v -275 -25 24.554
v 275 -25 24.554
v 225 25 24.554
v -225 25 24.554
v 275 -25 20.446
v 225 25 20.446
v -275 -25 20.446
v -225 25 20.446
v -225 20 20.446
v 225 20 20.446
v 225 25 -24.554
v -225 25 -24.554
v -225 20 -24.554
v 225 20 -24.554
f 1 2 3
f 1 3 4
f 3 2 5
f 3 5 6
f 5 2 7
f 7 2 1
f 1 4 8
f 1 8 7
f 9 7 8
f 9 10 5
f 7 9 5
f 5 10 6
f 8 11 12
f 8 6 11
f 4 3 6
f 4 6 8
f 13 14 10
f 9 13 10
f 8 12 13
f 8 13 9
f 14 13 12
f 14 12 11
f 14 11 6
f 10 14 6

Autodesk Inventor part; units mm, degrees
ref_plane "YZ Plane" through (0, 0, 0) normal (1, 0, 0) x (0, 1, 0)
ref_plane "XZ Plane" through (0, 0, 0) normal (0, 1, 0) x (-1, 0, 0)
ref_plane "XY Plane" through (0, 0, 0) normal (0, 0, 1) x (1, 0, 0)
sketch "Sketch1" plane through (0, 0, 0) normal (0, 1, 0) x (-1, 0, 0)
  line L0 (-275, 24.5536) -> (275, 24.5536)
  line L1 (275, 24.5536) -> (275, -24.5536)
  line L2 (275, -24.5536) -> (-275, -24.5536)
  line L3 (-275, -24.5536) -> (-275, 24.5536)
  point P0 (0, 0)
  dimension "d14" = 550
extrude "Extrusion1" add sketch "Sketch1" along normal mid plane 50
sketch "Sketch2" plane through (275, -25, -24.5536) normal (1, 0, 0) x (0, 0, -1)
  line L0 (0, 0) -> (0, 50) projected
  line L1 (0, 45) -> (-45, 45)
  line L2 (-45, 45) -> (-45, 0)
  line L3 (-49.1071, 0) -> (0, 0) projected
  line L4 (-45, 0) -> (0, 0)
  line L5 (0, 0) -> (0, 45)
  point P0 (-24.5536, 25)
extrude "Extrusion2" cut sketch "Sketch2" against normal through all
sketch "Sketch5" plane through (0, 25, 0) normal (0, 1, 0) x (1, 0, 0)
  line L0 (-275, 24.5536) -> (-275, -24.5536) projected
  line L1 (-275, 24.5536) -> (-225, 24.5536)
  line L2 (275, 24.5536) -> (-275, 24.5536) projected
  line L3 (-225, 24.5536) -> (-225, -20.4464)
  line L4 (-275, -20.4464) -> (275, -20.4464) projected
  line L5 (-225, -20.4464) -> (-275, -20.4464)
  line L6 (-275, -20.4464) -> (-275, 24.5536)
  line L7 (275, -24.5536) -> (275, 24.5536) projected
  line L8 (275, 24.5536) -> (225, 24.5536)
  line L9 (225, 24.5536) -> (225, -20.4464)
  line L10 (225, -20.4464) -> (275, -20.4464)
  line L11 (275, -20.4464) -> (275, 24.5536)
  point P0 (0, 0)
extrude "Extrusion5" cut sketch "Sketch5" against normal blind 10 contours L1 L3 L4 L0 | L2 L7 L4 L9
sketch "Sketch6" plane through (-275, 25, 24.5536) normal (0, 0, 1) x (1, 0, 0)
  line L0 (50, 0) -> (0, 0) projected
  line L1 (550, -50) -> (0, -50) projected
  line L2 (50, 0) -> (0, -50)
  line L3 (0, -50) -> (0, 0)
  line L4 (0, 0) -> (50, 0)
  line L5 (0, 0) -> (550, 0) projected
  line L6 (500, 0) -> (550, 0)
  line L7 (550, 0) -> (550, -50)
  line L8 (550, -50) -> (500, 0)
  point P0 (275, -25)
extrude "Extrusion6" cut sketch "Sketch6" against normal blind 5 contours L2 L3 L0 | L5 L7 L8
properties part number "angle1"
